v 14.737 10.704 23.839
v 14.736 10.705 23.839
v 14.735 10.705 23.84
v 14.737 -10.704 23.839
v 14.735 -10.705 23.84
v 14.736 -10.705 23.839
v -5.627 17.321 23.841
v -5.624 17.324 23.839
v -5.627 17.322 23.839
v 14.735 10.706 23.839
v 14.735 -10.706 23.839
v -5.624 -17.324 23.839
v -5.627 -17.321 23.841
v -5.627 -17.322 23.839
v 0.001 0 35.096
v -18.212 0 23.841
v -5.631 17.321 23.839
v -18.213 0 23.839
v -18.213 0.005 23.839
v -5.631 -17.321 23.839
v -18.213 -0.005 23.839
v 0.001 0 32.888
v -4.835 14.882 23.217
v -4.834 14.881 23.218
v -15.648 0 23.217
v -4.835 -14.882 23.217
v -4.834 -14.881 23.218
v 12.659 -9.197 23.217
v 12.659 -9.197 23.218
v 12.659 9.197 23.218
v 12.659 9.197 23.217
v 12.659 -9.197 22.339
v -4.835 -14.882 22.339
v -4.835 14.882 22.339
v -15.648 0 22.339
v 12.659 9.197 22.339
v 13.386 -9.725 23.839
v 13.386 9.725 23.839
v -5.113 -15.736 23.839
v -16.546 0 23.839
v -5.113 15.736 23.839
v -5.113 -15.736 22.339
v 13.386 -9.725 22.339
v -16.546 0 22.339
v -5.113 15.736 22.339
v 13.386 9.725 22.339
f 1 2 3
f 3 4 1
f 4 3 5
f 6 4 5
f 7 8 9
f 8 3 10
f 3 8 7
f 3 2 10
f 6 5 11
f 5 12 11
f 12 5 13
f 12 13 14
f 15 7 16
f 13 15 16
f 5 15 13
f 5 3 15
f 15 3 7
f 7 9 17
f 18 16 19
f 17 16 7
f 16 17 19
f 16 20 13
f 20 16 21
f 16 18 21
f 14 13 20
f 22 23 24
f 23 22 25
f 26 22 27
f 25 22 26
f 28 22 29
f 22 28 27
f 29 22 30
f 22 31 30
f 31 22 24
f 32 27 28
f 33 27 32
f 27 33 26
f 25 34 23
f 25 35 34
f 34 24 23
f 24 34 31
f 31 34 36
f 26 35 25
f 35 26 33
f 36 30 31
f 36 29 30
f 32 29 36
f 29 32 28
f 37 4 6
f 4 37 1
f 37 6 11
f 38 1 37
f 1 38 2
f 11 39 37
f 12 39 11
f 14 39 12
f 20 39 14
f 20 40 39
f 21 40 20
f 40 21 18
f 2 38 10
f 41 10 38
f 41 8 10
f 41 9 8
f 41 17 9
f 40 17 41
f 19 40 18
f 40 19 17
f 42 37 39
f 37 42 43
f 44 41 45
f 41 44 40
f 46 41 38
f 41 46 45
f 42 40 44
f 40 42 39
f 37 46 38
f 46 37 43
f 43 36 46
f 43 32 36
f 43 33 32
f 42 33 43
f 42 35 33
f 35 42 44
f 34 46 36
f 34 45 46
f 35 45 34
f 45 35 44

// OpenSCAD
arete = 21.409;
creux = 1; // creux ou plein || 1 ou 0
paroi = 1.5;
echelleReductionAjustementBouchon = 0.972;
bouchon = 1; // 1 ou 0
corps = 0; // 1 ou 0

// Controle rotation viewport quand animation en route
//$vpr = [70, 0, $t * 180];

/* Forme
Choix parmi:
- 0 => Etoilé
- 1 => Christique
- 2 => Christique_inversé
- 3 => Pentakis // (all points on sphere)
- 4 => Animate // voir plus bas pour plus d'infos
*/
forme_ID = 1;

/////////

function dodeca_ext_radius(a) = 
    a/2*(sqrt(2));
    
function dodeca_sphere_inscrite_radius(a) = 
    a*sqrt(5/8+11/(8*sqrt(5)));
    
function dodeca_arete_from_sphere_inscrite(radius) = 
    radius/sqrt(5/8+11/(8*sqrt(5)));    

spike = [
    2.3417, // Etoilé, scale 1 is arete = 1.236 mm, diametre = 6.24 mm, arete pyramide = 2 mm
    0.8944, // Christique, scale 1 is arete = 1.236 mm, diametre = 4.05 mm
    -0.8944, // Christique inversé
    0.4279 // Pentakis
];

if (forme_ID == 4) {
    Animate();
} else {  
    if (creux == 0) {
        small_stellated_dodecahedron(spike[forme_ID], small_stellated_dodecahedron);
    } else {
        if (corps == 1) {
            corps_ouvert();
        }
        if (bouchon == 1) {
            bouchon();
        }
    }
}


//		poly_creux();
//		decoupe_bouchon();

module corps_ouvert() {
    rotate([180, 0, 0])
	difference() {
		poly_creux();
		decoupe_bouchon();
	}
}

module poly_creux() {
    areteInt = dodeca_arete_from_sphere_inscrite(dodeca_sphere_inscrite_radius(arete)-paroi);
                         
    echo("arete int: ", areteInt);
    
    difference() {
        small_stellated_dodecahedron(spike[forme_ID], arete);
        small_stellated_dodecahedron(spike[forme_ID], areteInt);
    }
}

module decoupe_bouchon(scale=1) {
    distance = dodeca_sphere_inscrite_radius(arete);
	rotate([0,0,36]) translate([0,0, distance])
		cylinder(99, r=arete*0.853, $fn=5, center=false);
	rotate([0,0,36]) translate([0,0, distance-paroi])
		cylinder(paroi, r=(arete-paroi)*0.855*scale, $fn=5, center=false);
}

module supplement_feuillure_bouchon() {
    distance = dodeca_sphere_inscrite_radius(arete);
    rotate([0,0,36]) translate([0,0, distance-paroi-1])
    difference() {   
		cylinder(paroi+1, r=(arete-paroi)*0.85, $fn=5, center=false);
		cylinder(paroi+1, r=(arete-2*paroi)*0.85, $fn=5, center=false);
    }
}

module bouchon() {
//	scale([echelleReductionAjustementBouchon, echelleReductionAjustementBouchon, 0.995])
	difference () {
        intersection() {
            union() {
                poly_creux();
                supplement_feuillure_bouchon();
            }
            decoupe_bouchon(echelleReductionAjustementBouchon);
        }
	}
}

// }}

/*
animates the single parameter of the
module small_stellated_dodecahedron

1/ choose animate in the view menu
2/ sets fps to an appropiate number for
your machine - 20 is good
3/ set steps to a number that keeps the
change from happening too slowly or
too fast - 200 is good
*/
module Animate() {
    small_stellated_dodecahedron(-3.4317*abs(2*$t-1)+2.4317);
}

// Étoilé
// scale 1 is arete = 1.236 mm, diametre = 6.24 mm, arete pyramide = 2 mm
module Etoile(a) {
    small_stellated_dodecahedron(2.3417, a);
}

// Christique
// scale 1 is arete = 1.236 mm, diametre = 4.05 mm
module Christique(a) {
    small_stellated_dodecahedron(0.8944, a);
}

// Christique inversé
module Christique_inv(a) {
    small_stellated_dodecahedron(-0.8944, a);
}

// Pentakis (all points on sphere)
module Pentakis(a) {
    small_stellated_dodecahedron(0.4279, a);
}

module small_stellated_dodecahedron(scale, ar)
{
a=scale*0.61803;
b=scale*0.38197;
    
length = ar ? ar : arete;
echo("length:", length);
// scale(1) => arete 1.236 mm
scale(length/1.236)

// Posé sur 3 pointes
//rotate([20.91, 0, 0])

// Posé sur 1 pointe
rotate([0, 31.72, 0])

/*
constructed from 12 pentagonal pyramids placed
on the faces of a dodecahedron.
first 20 points are the vertices of a dodecahedron
next 12 points are the vertices of the centers
of the faces of the dodecahedron

if scale = 0 a dodecahedron is created

if scale is positive the centers of the
faces are moved out fron the center of the
dodecahedron

if scale is negative the centers of the
faces are moved in towards the center of the
dodecahedron

the apex angles of the triangles that make up
the faces of the stellated dodecahedron
are 36 degrees - the scale factor that
makes a small stellated dodecahedron
is approximately 2.3417
length of side of pentagonal pyramid for
small stellated dodecahedron = 2

the apex angles of the triangles that make up
the faces of a pentakis dodecahedron ( one of
the Catalan solids) are about 68.619 degrees
the scale factor to make one is ca 0.4279

if len = length of the sides of the
pentagonal pyramid then approximately

scale = + or - sqrt((len*len/0.52786) - 2.09443)

lengths of the sides of the base are sqrt(5)-1
or 1.23607 to make equilateral triangles scale
factor is 0.8944

distance from centers of faces to origin ca 1.37638
distance from dodecahedral points to origin sqrt(3)




pcm

*/

polyhedron
       (points = [
                 [   1.00000,   1.00000,   1.00000],
                 [   1.00000,   1.00000,  -1.00000],
                 [   1.00000,  -1.00000,   1.00000],
                 [   1.00000,  -1.00000,  -1.00000],
                 [  -1.00000,   1.00000,   1.00000],
                 [  -1.00000,   1.00000,  -1.00000],
                 [  -1.00000,  -1.00000,   1.00000],
                 [  -1.00000,  -1.00000,  -1.00000],
                 [   0.00000,   0.61803,   1.61803],
                 [   0.00000,   0.61803,  -1.61803],
                 [   0.00000,  -0.61803,   1.61803],
                 [   0.00000,  -0.61803,  -1.61803],
                 [   0.61803,   1.61803,   0.00000],
                 [   0.61803,  -1.61803,   0.00000],
                 [  -0.61803,   1.61803,   0.00000],
                 [  -0.61803,  -1.61803,   0.00000],
                 [   1.61803,   0.00000,   0.61803],
                 [   1.61803,   0.00000,  -0.61803],
                 [  -1.61803,   0.00000,   0.61803],
                 [  -1.61803,   0.00000,  -0.61803],
                 [   1.17082+a,   0.72361+b,   0.00000],
                 [   0.72361+b,   0.00000,   1.17082+a],
                 [   0.00000,   1.17082+a,   0.72361+b],
                 [   0.00000,   1.17082+a,  -0.72361-b],
                 [   0.72361+b,   0.00000,  -1.17082-a],
                 [   1.17082+a,  -0.72361-b,   0.00000],
                 [   0.00000,  -1.17082-a,   0.72361+b],
                 [   0.00000,  -1.17082-a,  -0.72361-b],
                 [  -0.72361-b,   0.00000,   1.17082+a],
                 [  -1.17082-a,   0.72361+b,   0.00000],
                 [  -0.72361-b,   0.00000,  -1.17082-a],
                 [  -1.17082-a,  -0.72361-b,   0.00000],
                   ],

           faces = [

                [0,20,16],[16,20,17],[17,20,1],
                [1,20,12],[12,20,0],
                [0,21,8],[8,21,10],[10,21,2],
                [2,21,16],[16,21,0],
                 [0,22,12],[12,22,14],[14,22,4],
                [4,22,8],[8,22,0],
                [1,23,9],[9,23,5],[5,23,14],
                [14,23,12],[12,23,1],
                [1,24,17],[17,24,3],[3,24,11],
                [11,24,9],[9,24,1],
                [16,25,2],[17,25,16],[3,25,17],
                 [13,25,3],[2,25,13],
                 [2,26,10],[10,26,6],[6,26,15],
                 [15,26,13],[13,26,2],
                 [3,27,13],[13,27,15],[15,27,7],
                 [7,27,11],[11,27,3],
                [4,28,18],[18,28,6],[6,28,10],
                 [10,28,8],[8,28,4],
                 [4,29,14],[14,29,5],[5,29,19],
                 [19,29,18],[18,29,4],
                  [5,30,9],[9,30,11],[11,30,7],
                 [7,30,19],[19,30,5],
                 [6,31,18],[18,31,19],[19,31,7],
                 [7,31,15],[15,31,6],

                 ]
      );
}
